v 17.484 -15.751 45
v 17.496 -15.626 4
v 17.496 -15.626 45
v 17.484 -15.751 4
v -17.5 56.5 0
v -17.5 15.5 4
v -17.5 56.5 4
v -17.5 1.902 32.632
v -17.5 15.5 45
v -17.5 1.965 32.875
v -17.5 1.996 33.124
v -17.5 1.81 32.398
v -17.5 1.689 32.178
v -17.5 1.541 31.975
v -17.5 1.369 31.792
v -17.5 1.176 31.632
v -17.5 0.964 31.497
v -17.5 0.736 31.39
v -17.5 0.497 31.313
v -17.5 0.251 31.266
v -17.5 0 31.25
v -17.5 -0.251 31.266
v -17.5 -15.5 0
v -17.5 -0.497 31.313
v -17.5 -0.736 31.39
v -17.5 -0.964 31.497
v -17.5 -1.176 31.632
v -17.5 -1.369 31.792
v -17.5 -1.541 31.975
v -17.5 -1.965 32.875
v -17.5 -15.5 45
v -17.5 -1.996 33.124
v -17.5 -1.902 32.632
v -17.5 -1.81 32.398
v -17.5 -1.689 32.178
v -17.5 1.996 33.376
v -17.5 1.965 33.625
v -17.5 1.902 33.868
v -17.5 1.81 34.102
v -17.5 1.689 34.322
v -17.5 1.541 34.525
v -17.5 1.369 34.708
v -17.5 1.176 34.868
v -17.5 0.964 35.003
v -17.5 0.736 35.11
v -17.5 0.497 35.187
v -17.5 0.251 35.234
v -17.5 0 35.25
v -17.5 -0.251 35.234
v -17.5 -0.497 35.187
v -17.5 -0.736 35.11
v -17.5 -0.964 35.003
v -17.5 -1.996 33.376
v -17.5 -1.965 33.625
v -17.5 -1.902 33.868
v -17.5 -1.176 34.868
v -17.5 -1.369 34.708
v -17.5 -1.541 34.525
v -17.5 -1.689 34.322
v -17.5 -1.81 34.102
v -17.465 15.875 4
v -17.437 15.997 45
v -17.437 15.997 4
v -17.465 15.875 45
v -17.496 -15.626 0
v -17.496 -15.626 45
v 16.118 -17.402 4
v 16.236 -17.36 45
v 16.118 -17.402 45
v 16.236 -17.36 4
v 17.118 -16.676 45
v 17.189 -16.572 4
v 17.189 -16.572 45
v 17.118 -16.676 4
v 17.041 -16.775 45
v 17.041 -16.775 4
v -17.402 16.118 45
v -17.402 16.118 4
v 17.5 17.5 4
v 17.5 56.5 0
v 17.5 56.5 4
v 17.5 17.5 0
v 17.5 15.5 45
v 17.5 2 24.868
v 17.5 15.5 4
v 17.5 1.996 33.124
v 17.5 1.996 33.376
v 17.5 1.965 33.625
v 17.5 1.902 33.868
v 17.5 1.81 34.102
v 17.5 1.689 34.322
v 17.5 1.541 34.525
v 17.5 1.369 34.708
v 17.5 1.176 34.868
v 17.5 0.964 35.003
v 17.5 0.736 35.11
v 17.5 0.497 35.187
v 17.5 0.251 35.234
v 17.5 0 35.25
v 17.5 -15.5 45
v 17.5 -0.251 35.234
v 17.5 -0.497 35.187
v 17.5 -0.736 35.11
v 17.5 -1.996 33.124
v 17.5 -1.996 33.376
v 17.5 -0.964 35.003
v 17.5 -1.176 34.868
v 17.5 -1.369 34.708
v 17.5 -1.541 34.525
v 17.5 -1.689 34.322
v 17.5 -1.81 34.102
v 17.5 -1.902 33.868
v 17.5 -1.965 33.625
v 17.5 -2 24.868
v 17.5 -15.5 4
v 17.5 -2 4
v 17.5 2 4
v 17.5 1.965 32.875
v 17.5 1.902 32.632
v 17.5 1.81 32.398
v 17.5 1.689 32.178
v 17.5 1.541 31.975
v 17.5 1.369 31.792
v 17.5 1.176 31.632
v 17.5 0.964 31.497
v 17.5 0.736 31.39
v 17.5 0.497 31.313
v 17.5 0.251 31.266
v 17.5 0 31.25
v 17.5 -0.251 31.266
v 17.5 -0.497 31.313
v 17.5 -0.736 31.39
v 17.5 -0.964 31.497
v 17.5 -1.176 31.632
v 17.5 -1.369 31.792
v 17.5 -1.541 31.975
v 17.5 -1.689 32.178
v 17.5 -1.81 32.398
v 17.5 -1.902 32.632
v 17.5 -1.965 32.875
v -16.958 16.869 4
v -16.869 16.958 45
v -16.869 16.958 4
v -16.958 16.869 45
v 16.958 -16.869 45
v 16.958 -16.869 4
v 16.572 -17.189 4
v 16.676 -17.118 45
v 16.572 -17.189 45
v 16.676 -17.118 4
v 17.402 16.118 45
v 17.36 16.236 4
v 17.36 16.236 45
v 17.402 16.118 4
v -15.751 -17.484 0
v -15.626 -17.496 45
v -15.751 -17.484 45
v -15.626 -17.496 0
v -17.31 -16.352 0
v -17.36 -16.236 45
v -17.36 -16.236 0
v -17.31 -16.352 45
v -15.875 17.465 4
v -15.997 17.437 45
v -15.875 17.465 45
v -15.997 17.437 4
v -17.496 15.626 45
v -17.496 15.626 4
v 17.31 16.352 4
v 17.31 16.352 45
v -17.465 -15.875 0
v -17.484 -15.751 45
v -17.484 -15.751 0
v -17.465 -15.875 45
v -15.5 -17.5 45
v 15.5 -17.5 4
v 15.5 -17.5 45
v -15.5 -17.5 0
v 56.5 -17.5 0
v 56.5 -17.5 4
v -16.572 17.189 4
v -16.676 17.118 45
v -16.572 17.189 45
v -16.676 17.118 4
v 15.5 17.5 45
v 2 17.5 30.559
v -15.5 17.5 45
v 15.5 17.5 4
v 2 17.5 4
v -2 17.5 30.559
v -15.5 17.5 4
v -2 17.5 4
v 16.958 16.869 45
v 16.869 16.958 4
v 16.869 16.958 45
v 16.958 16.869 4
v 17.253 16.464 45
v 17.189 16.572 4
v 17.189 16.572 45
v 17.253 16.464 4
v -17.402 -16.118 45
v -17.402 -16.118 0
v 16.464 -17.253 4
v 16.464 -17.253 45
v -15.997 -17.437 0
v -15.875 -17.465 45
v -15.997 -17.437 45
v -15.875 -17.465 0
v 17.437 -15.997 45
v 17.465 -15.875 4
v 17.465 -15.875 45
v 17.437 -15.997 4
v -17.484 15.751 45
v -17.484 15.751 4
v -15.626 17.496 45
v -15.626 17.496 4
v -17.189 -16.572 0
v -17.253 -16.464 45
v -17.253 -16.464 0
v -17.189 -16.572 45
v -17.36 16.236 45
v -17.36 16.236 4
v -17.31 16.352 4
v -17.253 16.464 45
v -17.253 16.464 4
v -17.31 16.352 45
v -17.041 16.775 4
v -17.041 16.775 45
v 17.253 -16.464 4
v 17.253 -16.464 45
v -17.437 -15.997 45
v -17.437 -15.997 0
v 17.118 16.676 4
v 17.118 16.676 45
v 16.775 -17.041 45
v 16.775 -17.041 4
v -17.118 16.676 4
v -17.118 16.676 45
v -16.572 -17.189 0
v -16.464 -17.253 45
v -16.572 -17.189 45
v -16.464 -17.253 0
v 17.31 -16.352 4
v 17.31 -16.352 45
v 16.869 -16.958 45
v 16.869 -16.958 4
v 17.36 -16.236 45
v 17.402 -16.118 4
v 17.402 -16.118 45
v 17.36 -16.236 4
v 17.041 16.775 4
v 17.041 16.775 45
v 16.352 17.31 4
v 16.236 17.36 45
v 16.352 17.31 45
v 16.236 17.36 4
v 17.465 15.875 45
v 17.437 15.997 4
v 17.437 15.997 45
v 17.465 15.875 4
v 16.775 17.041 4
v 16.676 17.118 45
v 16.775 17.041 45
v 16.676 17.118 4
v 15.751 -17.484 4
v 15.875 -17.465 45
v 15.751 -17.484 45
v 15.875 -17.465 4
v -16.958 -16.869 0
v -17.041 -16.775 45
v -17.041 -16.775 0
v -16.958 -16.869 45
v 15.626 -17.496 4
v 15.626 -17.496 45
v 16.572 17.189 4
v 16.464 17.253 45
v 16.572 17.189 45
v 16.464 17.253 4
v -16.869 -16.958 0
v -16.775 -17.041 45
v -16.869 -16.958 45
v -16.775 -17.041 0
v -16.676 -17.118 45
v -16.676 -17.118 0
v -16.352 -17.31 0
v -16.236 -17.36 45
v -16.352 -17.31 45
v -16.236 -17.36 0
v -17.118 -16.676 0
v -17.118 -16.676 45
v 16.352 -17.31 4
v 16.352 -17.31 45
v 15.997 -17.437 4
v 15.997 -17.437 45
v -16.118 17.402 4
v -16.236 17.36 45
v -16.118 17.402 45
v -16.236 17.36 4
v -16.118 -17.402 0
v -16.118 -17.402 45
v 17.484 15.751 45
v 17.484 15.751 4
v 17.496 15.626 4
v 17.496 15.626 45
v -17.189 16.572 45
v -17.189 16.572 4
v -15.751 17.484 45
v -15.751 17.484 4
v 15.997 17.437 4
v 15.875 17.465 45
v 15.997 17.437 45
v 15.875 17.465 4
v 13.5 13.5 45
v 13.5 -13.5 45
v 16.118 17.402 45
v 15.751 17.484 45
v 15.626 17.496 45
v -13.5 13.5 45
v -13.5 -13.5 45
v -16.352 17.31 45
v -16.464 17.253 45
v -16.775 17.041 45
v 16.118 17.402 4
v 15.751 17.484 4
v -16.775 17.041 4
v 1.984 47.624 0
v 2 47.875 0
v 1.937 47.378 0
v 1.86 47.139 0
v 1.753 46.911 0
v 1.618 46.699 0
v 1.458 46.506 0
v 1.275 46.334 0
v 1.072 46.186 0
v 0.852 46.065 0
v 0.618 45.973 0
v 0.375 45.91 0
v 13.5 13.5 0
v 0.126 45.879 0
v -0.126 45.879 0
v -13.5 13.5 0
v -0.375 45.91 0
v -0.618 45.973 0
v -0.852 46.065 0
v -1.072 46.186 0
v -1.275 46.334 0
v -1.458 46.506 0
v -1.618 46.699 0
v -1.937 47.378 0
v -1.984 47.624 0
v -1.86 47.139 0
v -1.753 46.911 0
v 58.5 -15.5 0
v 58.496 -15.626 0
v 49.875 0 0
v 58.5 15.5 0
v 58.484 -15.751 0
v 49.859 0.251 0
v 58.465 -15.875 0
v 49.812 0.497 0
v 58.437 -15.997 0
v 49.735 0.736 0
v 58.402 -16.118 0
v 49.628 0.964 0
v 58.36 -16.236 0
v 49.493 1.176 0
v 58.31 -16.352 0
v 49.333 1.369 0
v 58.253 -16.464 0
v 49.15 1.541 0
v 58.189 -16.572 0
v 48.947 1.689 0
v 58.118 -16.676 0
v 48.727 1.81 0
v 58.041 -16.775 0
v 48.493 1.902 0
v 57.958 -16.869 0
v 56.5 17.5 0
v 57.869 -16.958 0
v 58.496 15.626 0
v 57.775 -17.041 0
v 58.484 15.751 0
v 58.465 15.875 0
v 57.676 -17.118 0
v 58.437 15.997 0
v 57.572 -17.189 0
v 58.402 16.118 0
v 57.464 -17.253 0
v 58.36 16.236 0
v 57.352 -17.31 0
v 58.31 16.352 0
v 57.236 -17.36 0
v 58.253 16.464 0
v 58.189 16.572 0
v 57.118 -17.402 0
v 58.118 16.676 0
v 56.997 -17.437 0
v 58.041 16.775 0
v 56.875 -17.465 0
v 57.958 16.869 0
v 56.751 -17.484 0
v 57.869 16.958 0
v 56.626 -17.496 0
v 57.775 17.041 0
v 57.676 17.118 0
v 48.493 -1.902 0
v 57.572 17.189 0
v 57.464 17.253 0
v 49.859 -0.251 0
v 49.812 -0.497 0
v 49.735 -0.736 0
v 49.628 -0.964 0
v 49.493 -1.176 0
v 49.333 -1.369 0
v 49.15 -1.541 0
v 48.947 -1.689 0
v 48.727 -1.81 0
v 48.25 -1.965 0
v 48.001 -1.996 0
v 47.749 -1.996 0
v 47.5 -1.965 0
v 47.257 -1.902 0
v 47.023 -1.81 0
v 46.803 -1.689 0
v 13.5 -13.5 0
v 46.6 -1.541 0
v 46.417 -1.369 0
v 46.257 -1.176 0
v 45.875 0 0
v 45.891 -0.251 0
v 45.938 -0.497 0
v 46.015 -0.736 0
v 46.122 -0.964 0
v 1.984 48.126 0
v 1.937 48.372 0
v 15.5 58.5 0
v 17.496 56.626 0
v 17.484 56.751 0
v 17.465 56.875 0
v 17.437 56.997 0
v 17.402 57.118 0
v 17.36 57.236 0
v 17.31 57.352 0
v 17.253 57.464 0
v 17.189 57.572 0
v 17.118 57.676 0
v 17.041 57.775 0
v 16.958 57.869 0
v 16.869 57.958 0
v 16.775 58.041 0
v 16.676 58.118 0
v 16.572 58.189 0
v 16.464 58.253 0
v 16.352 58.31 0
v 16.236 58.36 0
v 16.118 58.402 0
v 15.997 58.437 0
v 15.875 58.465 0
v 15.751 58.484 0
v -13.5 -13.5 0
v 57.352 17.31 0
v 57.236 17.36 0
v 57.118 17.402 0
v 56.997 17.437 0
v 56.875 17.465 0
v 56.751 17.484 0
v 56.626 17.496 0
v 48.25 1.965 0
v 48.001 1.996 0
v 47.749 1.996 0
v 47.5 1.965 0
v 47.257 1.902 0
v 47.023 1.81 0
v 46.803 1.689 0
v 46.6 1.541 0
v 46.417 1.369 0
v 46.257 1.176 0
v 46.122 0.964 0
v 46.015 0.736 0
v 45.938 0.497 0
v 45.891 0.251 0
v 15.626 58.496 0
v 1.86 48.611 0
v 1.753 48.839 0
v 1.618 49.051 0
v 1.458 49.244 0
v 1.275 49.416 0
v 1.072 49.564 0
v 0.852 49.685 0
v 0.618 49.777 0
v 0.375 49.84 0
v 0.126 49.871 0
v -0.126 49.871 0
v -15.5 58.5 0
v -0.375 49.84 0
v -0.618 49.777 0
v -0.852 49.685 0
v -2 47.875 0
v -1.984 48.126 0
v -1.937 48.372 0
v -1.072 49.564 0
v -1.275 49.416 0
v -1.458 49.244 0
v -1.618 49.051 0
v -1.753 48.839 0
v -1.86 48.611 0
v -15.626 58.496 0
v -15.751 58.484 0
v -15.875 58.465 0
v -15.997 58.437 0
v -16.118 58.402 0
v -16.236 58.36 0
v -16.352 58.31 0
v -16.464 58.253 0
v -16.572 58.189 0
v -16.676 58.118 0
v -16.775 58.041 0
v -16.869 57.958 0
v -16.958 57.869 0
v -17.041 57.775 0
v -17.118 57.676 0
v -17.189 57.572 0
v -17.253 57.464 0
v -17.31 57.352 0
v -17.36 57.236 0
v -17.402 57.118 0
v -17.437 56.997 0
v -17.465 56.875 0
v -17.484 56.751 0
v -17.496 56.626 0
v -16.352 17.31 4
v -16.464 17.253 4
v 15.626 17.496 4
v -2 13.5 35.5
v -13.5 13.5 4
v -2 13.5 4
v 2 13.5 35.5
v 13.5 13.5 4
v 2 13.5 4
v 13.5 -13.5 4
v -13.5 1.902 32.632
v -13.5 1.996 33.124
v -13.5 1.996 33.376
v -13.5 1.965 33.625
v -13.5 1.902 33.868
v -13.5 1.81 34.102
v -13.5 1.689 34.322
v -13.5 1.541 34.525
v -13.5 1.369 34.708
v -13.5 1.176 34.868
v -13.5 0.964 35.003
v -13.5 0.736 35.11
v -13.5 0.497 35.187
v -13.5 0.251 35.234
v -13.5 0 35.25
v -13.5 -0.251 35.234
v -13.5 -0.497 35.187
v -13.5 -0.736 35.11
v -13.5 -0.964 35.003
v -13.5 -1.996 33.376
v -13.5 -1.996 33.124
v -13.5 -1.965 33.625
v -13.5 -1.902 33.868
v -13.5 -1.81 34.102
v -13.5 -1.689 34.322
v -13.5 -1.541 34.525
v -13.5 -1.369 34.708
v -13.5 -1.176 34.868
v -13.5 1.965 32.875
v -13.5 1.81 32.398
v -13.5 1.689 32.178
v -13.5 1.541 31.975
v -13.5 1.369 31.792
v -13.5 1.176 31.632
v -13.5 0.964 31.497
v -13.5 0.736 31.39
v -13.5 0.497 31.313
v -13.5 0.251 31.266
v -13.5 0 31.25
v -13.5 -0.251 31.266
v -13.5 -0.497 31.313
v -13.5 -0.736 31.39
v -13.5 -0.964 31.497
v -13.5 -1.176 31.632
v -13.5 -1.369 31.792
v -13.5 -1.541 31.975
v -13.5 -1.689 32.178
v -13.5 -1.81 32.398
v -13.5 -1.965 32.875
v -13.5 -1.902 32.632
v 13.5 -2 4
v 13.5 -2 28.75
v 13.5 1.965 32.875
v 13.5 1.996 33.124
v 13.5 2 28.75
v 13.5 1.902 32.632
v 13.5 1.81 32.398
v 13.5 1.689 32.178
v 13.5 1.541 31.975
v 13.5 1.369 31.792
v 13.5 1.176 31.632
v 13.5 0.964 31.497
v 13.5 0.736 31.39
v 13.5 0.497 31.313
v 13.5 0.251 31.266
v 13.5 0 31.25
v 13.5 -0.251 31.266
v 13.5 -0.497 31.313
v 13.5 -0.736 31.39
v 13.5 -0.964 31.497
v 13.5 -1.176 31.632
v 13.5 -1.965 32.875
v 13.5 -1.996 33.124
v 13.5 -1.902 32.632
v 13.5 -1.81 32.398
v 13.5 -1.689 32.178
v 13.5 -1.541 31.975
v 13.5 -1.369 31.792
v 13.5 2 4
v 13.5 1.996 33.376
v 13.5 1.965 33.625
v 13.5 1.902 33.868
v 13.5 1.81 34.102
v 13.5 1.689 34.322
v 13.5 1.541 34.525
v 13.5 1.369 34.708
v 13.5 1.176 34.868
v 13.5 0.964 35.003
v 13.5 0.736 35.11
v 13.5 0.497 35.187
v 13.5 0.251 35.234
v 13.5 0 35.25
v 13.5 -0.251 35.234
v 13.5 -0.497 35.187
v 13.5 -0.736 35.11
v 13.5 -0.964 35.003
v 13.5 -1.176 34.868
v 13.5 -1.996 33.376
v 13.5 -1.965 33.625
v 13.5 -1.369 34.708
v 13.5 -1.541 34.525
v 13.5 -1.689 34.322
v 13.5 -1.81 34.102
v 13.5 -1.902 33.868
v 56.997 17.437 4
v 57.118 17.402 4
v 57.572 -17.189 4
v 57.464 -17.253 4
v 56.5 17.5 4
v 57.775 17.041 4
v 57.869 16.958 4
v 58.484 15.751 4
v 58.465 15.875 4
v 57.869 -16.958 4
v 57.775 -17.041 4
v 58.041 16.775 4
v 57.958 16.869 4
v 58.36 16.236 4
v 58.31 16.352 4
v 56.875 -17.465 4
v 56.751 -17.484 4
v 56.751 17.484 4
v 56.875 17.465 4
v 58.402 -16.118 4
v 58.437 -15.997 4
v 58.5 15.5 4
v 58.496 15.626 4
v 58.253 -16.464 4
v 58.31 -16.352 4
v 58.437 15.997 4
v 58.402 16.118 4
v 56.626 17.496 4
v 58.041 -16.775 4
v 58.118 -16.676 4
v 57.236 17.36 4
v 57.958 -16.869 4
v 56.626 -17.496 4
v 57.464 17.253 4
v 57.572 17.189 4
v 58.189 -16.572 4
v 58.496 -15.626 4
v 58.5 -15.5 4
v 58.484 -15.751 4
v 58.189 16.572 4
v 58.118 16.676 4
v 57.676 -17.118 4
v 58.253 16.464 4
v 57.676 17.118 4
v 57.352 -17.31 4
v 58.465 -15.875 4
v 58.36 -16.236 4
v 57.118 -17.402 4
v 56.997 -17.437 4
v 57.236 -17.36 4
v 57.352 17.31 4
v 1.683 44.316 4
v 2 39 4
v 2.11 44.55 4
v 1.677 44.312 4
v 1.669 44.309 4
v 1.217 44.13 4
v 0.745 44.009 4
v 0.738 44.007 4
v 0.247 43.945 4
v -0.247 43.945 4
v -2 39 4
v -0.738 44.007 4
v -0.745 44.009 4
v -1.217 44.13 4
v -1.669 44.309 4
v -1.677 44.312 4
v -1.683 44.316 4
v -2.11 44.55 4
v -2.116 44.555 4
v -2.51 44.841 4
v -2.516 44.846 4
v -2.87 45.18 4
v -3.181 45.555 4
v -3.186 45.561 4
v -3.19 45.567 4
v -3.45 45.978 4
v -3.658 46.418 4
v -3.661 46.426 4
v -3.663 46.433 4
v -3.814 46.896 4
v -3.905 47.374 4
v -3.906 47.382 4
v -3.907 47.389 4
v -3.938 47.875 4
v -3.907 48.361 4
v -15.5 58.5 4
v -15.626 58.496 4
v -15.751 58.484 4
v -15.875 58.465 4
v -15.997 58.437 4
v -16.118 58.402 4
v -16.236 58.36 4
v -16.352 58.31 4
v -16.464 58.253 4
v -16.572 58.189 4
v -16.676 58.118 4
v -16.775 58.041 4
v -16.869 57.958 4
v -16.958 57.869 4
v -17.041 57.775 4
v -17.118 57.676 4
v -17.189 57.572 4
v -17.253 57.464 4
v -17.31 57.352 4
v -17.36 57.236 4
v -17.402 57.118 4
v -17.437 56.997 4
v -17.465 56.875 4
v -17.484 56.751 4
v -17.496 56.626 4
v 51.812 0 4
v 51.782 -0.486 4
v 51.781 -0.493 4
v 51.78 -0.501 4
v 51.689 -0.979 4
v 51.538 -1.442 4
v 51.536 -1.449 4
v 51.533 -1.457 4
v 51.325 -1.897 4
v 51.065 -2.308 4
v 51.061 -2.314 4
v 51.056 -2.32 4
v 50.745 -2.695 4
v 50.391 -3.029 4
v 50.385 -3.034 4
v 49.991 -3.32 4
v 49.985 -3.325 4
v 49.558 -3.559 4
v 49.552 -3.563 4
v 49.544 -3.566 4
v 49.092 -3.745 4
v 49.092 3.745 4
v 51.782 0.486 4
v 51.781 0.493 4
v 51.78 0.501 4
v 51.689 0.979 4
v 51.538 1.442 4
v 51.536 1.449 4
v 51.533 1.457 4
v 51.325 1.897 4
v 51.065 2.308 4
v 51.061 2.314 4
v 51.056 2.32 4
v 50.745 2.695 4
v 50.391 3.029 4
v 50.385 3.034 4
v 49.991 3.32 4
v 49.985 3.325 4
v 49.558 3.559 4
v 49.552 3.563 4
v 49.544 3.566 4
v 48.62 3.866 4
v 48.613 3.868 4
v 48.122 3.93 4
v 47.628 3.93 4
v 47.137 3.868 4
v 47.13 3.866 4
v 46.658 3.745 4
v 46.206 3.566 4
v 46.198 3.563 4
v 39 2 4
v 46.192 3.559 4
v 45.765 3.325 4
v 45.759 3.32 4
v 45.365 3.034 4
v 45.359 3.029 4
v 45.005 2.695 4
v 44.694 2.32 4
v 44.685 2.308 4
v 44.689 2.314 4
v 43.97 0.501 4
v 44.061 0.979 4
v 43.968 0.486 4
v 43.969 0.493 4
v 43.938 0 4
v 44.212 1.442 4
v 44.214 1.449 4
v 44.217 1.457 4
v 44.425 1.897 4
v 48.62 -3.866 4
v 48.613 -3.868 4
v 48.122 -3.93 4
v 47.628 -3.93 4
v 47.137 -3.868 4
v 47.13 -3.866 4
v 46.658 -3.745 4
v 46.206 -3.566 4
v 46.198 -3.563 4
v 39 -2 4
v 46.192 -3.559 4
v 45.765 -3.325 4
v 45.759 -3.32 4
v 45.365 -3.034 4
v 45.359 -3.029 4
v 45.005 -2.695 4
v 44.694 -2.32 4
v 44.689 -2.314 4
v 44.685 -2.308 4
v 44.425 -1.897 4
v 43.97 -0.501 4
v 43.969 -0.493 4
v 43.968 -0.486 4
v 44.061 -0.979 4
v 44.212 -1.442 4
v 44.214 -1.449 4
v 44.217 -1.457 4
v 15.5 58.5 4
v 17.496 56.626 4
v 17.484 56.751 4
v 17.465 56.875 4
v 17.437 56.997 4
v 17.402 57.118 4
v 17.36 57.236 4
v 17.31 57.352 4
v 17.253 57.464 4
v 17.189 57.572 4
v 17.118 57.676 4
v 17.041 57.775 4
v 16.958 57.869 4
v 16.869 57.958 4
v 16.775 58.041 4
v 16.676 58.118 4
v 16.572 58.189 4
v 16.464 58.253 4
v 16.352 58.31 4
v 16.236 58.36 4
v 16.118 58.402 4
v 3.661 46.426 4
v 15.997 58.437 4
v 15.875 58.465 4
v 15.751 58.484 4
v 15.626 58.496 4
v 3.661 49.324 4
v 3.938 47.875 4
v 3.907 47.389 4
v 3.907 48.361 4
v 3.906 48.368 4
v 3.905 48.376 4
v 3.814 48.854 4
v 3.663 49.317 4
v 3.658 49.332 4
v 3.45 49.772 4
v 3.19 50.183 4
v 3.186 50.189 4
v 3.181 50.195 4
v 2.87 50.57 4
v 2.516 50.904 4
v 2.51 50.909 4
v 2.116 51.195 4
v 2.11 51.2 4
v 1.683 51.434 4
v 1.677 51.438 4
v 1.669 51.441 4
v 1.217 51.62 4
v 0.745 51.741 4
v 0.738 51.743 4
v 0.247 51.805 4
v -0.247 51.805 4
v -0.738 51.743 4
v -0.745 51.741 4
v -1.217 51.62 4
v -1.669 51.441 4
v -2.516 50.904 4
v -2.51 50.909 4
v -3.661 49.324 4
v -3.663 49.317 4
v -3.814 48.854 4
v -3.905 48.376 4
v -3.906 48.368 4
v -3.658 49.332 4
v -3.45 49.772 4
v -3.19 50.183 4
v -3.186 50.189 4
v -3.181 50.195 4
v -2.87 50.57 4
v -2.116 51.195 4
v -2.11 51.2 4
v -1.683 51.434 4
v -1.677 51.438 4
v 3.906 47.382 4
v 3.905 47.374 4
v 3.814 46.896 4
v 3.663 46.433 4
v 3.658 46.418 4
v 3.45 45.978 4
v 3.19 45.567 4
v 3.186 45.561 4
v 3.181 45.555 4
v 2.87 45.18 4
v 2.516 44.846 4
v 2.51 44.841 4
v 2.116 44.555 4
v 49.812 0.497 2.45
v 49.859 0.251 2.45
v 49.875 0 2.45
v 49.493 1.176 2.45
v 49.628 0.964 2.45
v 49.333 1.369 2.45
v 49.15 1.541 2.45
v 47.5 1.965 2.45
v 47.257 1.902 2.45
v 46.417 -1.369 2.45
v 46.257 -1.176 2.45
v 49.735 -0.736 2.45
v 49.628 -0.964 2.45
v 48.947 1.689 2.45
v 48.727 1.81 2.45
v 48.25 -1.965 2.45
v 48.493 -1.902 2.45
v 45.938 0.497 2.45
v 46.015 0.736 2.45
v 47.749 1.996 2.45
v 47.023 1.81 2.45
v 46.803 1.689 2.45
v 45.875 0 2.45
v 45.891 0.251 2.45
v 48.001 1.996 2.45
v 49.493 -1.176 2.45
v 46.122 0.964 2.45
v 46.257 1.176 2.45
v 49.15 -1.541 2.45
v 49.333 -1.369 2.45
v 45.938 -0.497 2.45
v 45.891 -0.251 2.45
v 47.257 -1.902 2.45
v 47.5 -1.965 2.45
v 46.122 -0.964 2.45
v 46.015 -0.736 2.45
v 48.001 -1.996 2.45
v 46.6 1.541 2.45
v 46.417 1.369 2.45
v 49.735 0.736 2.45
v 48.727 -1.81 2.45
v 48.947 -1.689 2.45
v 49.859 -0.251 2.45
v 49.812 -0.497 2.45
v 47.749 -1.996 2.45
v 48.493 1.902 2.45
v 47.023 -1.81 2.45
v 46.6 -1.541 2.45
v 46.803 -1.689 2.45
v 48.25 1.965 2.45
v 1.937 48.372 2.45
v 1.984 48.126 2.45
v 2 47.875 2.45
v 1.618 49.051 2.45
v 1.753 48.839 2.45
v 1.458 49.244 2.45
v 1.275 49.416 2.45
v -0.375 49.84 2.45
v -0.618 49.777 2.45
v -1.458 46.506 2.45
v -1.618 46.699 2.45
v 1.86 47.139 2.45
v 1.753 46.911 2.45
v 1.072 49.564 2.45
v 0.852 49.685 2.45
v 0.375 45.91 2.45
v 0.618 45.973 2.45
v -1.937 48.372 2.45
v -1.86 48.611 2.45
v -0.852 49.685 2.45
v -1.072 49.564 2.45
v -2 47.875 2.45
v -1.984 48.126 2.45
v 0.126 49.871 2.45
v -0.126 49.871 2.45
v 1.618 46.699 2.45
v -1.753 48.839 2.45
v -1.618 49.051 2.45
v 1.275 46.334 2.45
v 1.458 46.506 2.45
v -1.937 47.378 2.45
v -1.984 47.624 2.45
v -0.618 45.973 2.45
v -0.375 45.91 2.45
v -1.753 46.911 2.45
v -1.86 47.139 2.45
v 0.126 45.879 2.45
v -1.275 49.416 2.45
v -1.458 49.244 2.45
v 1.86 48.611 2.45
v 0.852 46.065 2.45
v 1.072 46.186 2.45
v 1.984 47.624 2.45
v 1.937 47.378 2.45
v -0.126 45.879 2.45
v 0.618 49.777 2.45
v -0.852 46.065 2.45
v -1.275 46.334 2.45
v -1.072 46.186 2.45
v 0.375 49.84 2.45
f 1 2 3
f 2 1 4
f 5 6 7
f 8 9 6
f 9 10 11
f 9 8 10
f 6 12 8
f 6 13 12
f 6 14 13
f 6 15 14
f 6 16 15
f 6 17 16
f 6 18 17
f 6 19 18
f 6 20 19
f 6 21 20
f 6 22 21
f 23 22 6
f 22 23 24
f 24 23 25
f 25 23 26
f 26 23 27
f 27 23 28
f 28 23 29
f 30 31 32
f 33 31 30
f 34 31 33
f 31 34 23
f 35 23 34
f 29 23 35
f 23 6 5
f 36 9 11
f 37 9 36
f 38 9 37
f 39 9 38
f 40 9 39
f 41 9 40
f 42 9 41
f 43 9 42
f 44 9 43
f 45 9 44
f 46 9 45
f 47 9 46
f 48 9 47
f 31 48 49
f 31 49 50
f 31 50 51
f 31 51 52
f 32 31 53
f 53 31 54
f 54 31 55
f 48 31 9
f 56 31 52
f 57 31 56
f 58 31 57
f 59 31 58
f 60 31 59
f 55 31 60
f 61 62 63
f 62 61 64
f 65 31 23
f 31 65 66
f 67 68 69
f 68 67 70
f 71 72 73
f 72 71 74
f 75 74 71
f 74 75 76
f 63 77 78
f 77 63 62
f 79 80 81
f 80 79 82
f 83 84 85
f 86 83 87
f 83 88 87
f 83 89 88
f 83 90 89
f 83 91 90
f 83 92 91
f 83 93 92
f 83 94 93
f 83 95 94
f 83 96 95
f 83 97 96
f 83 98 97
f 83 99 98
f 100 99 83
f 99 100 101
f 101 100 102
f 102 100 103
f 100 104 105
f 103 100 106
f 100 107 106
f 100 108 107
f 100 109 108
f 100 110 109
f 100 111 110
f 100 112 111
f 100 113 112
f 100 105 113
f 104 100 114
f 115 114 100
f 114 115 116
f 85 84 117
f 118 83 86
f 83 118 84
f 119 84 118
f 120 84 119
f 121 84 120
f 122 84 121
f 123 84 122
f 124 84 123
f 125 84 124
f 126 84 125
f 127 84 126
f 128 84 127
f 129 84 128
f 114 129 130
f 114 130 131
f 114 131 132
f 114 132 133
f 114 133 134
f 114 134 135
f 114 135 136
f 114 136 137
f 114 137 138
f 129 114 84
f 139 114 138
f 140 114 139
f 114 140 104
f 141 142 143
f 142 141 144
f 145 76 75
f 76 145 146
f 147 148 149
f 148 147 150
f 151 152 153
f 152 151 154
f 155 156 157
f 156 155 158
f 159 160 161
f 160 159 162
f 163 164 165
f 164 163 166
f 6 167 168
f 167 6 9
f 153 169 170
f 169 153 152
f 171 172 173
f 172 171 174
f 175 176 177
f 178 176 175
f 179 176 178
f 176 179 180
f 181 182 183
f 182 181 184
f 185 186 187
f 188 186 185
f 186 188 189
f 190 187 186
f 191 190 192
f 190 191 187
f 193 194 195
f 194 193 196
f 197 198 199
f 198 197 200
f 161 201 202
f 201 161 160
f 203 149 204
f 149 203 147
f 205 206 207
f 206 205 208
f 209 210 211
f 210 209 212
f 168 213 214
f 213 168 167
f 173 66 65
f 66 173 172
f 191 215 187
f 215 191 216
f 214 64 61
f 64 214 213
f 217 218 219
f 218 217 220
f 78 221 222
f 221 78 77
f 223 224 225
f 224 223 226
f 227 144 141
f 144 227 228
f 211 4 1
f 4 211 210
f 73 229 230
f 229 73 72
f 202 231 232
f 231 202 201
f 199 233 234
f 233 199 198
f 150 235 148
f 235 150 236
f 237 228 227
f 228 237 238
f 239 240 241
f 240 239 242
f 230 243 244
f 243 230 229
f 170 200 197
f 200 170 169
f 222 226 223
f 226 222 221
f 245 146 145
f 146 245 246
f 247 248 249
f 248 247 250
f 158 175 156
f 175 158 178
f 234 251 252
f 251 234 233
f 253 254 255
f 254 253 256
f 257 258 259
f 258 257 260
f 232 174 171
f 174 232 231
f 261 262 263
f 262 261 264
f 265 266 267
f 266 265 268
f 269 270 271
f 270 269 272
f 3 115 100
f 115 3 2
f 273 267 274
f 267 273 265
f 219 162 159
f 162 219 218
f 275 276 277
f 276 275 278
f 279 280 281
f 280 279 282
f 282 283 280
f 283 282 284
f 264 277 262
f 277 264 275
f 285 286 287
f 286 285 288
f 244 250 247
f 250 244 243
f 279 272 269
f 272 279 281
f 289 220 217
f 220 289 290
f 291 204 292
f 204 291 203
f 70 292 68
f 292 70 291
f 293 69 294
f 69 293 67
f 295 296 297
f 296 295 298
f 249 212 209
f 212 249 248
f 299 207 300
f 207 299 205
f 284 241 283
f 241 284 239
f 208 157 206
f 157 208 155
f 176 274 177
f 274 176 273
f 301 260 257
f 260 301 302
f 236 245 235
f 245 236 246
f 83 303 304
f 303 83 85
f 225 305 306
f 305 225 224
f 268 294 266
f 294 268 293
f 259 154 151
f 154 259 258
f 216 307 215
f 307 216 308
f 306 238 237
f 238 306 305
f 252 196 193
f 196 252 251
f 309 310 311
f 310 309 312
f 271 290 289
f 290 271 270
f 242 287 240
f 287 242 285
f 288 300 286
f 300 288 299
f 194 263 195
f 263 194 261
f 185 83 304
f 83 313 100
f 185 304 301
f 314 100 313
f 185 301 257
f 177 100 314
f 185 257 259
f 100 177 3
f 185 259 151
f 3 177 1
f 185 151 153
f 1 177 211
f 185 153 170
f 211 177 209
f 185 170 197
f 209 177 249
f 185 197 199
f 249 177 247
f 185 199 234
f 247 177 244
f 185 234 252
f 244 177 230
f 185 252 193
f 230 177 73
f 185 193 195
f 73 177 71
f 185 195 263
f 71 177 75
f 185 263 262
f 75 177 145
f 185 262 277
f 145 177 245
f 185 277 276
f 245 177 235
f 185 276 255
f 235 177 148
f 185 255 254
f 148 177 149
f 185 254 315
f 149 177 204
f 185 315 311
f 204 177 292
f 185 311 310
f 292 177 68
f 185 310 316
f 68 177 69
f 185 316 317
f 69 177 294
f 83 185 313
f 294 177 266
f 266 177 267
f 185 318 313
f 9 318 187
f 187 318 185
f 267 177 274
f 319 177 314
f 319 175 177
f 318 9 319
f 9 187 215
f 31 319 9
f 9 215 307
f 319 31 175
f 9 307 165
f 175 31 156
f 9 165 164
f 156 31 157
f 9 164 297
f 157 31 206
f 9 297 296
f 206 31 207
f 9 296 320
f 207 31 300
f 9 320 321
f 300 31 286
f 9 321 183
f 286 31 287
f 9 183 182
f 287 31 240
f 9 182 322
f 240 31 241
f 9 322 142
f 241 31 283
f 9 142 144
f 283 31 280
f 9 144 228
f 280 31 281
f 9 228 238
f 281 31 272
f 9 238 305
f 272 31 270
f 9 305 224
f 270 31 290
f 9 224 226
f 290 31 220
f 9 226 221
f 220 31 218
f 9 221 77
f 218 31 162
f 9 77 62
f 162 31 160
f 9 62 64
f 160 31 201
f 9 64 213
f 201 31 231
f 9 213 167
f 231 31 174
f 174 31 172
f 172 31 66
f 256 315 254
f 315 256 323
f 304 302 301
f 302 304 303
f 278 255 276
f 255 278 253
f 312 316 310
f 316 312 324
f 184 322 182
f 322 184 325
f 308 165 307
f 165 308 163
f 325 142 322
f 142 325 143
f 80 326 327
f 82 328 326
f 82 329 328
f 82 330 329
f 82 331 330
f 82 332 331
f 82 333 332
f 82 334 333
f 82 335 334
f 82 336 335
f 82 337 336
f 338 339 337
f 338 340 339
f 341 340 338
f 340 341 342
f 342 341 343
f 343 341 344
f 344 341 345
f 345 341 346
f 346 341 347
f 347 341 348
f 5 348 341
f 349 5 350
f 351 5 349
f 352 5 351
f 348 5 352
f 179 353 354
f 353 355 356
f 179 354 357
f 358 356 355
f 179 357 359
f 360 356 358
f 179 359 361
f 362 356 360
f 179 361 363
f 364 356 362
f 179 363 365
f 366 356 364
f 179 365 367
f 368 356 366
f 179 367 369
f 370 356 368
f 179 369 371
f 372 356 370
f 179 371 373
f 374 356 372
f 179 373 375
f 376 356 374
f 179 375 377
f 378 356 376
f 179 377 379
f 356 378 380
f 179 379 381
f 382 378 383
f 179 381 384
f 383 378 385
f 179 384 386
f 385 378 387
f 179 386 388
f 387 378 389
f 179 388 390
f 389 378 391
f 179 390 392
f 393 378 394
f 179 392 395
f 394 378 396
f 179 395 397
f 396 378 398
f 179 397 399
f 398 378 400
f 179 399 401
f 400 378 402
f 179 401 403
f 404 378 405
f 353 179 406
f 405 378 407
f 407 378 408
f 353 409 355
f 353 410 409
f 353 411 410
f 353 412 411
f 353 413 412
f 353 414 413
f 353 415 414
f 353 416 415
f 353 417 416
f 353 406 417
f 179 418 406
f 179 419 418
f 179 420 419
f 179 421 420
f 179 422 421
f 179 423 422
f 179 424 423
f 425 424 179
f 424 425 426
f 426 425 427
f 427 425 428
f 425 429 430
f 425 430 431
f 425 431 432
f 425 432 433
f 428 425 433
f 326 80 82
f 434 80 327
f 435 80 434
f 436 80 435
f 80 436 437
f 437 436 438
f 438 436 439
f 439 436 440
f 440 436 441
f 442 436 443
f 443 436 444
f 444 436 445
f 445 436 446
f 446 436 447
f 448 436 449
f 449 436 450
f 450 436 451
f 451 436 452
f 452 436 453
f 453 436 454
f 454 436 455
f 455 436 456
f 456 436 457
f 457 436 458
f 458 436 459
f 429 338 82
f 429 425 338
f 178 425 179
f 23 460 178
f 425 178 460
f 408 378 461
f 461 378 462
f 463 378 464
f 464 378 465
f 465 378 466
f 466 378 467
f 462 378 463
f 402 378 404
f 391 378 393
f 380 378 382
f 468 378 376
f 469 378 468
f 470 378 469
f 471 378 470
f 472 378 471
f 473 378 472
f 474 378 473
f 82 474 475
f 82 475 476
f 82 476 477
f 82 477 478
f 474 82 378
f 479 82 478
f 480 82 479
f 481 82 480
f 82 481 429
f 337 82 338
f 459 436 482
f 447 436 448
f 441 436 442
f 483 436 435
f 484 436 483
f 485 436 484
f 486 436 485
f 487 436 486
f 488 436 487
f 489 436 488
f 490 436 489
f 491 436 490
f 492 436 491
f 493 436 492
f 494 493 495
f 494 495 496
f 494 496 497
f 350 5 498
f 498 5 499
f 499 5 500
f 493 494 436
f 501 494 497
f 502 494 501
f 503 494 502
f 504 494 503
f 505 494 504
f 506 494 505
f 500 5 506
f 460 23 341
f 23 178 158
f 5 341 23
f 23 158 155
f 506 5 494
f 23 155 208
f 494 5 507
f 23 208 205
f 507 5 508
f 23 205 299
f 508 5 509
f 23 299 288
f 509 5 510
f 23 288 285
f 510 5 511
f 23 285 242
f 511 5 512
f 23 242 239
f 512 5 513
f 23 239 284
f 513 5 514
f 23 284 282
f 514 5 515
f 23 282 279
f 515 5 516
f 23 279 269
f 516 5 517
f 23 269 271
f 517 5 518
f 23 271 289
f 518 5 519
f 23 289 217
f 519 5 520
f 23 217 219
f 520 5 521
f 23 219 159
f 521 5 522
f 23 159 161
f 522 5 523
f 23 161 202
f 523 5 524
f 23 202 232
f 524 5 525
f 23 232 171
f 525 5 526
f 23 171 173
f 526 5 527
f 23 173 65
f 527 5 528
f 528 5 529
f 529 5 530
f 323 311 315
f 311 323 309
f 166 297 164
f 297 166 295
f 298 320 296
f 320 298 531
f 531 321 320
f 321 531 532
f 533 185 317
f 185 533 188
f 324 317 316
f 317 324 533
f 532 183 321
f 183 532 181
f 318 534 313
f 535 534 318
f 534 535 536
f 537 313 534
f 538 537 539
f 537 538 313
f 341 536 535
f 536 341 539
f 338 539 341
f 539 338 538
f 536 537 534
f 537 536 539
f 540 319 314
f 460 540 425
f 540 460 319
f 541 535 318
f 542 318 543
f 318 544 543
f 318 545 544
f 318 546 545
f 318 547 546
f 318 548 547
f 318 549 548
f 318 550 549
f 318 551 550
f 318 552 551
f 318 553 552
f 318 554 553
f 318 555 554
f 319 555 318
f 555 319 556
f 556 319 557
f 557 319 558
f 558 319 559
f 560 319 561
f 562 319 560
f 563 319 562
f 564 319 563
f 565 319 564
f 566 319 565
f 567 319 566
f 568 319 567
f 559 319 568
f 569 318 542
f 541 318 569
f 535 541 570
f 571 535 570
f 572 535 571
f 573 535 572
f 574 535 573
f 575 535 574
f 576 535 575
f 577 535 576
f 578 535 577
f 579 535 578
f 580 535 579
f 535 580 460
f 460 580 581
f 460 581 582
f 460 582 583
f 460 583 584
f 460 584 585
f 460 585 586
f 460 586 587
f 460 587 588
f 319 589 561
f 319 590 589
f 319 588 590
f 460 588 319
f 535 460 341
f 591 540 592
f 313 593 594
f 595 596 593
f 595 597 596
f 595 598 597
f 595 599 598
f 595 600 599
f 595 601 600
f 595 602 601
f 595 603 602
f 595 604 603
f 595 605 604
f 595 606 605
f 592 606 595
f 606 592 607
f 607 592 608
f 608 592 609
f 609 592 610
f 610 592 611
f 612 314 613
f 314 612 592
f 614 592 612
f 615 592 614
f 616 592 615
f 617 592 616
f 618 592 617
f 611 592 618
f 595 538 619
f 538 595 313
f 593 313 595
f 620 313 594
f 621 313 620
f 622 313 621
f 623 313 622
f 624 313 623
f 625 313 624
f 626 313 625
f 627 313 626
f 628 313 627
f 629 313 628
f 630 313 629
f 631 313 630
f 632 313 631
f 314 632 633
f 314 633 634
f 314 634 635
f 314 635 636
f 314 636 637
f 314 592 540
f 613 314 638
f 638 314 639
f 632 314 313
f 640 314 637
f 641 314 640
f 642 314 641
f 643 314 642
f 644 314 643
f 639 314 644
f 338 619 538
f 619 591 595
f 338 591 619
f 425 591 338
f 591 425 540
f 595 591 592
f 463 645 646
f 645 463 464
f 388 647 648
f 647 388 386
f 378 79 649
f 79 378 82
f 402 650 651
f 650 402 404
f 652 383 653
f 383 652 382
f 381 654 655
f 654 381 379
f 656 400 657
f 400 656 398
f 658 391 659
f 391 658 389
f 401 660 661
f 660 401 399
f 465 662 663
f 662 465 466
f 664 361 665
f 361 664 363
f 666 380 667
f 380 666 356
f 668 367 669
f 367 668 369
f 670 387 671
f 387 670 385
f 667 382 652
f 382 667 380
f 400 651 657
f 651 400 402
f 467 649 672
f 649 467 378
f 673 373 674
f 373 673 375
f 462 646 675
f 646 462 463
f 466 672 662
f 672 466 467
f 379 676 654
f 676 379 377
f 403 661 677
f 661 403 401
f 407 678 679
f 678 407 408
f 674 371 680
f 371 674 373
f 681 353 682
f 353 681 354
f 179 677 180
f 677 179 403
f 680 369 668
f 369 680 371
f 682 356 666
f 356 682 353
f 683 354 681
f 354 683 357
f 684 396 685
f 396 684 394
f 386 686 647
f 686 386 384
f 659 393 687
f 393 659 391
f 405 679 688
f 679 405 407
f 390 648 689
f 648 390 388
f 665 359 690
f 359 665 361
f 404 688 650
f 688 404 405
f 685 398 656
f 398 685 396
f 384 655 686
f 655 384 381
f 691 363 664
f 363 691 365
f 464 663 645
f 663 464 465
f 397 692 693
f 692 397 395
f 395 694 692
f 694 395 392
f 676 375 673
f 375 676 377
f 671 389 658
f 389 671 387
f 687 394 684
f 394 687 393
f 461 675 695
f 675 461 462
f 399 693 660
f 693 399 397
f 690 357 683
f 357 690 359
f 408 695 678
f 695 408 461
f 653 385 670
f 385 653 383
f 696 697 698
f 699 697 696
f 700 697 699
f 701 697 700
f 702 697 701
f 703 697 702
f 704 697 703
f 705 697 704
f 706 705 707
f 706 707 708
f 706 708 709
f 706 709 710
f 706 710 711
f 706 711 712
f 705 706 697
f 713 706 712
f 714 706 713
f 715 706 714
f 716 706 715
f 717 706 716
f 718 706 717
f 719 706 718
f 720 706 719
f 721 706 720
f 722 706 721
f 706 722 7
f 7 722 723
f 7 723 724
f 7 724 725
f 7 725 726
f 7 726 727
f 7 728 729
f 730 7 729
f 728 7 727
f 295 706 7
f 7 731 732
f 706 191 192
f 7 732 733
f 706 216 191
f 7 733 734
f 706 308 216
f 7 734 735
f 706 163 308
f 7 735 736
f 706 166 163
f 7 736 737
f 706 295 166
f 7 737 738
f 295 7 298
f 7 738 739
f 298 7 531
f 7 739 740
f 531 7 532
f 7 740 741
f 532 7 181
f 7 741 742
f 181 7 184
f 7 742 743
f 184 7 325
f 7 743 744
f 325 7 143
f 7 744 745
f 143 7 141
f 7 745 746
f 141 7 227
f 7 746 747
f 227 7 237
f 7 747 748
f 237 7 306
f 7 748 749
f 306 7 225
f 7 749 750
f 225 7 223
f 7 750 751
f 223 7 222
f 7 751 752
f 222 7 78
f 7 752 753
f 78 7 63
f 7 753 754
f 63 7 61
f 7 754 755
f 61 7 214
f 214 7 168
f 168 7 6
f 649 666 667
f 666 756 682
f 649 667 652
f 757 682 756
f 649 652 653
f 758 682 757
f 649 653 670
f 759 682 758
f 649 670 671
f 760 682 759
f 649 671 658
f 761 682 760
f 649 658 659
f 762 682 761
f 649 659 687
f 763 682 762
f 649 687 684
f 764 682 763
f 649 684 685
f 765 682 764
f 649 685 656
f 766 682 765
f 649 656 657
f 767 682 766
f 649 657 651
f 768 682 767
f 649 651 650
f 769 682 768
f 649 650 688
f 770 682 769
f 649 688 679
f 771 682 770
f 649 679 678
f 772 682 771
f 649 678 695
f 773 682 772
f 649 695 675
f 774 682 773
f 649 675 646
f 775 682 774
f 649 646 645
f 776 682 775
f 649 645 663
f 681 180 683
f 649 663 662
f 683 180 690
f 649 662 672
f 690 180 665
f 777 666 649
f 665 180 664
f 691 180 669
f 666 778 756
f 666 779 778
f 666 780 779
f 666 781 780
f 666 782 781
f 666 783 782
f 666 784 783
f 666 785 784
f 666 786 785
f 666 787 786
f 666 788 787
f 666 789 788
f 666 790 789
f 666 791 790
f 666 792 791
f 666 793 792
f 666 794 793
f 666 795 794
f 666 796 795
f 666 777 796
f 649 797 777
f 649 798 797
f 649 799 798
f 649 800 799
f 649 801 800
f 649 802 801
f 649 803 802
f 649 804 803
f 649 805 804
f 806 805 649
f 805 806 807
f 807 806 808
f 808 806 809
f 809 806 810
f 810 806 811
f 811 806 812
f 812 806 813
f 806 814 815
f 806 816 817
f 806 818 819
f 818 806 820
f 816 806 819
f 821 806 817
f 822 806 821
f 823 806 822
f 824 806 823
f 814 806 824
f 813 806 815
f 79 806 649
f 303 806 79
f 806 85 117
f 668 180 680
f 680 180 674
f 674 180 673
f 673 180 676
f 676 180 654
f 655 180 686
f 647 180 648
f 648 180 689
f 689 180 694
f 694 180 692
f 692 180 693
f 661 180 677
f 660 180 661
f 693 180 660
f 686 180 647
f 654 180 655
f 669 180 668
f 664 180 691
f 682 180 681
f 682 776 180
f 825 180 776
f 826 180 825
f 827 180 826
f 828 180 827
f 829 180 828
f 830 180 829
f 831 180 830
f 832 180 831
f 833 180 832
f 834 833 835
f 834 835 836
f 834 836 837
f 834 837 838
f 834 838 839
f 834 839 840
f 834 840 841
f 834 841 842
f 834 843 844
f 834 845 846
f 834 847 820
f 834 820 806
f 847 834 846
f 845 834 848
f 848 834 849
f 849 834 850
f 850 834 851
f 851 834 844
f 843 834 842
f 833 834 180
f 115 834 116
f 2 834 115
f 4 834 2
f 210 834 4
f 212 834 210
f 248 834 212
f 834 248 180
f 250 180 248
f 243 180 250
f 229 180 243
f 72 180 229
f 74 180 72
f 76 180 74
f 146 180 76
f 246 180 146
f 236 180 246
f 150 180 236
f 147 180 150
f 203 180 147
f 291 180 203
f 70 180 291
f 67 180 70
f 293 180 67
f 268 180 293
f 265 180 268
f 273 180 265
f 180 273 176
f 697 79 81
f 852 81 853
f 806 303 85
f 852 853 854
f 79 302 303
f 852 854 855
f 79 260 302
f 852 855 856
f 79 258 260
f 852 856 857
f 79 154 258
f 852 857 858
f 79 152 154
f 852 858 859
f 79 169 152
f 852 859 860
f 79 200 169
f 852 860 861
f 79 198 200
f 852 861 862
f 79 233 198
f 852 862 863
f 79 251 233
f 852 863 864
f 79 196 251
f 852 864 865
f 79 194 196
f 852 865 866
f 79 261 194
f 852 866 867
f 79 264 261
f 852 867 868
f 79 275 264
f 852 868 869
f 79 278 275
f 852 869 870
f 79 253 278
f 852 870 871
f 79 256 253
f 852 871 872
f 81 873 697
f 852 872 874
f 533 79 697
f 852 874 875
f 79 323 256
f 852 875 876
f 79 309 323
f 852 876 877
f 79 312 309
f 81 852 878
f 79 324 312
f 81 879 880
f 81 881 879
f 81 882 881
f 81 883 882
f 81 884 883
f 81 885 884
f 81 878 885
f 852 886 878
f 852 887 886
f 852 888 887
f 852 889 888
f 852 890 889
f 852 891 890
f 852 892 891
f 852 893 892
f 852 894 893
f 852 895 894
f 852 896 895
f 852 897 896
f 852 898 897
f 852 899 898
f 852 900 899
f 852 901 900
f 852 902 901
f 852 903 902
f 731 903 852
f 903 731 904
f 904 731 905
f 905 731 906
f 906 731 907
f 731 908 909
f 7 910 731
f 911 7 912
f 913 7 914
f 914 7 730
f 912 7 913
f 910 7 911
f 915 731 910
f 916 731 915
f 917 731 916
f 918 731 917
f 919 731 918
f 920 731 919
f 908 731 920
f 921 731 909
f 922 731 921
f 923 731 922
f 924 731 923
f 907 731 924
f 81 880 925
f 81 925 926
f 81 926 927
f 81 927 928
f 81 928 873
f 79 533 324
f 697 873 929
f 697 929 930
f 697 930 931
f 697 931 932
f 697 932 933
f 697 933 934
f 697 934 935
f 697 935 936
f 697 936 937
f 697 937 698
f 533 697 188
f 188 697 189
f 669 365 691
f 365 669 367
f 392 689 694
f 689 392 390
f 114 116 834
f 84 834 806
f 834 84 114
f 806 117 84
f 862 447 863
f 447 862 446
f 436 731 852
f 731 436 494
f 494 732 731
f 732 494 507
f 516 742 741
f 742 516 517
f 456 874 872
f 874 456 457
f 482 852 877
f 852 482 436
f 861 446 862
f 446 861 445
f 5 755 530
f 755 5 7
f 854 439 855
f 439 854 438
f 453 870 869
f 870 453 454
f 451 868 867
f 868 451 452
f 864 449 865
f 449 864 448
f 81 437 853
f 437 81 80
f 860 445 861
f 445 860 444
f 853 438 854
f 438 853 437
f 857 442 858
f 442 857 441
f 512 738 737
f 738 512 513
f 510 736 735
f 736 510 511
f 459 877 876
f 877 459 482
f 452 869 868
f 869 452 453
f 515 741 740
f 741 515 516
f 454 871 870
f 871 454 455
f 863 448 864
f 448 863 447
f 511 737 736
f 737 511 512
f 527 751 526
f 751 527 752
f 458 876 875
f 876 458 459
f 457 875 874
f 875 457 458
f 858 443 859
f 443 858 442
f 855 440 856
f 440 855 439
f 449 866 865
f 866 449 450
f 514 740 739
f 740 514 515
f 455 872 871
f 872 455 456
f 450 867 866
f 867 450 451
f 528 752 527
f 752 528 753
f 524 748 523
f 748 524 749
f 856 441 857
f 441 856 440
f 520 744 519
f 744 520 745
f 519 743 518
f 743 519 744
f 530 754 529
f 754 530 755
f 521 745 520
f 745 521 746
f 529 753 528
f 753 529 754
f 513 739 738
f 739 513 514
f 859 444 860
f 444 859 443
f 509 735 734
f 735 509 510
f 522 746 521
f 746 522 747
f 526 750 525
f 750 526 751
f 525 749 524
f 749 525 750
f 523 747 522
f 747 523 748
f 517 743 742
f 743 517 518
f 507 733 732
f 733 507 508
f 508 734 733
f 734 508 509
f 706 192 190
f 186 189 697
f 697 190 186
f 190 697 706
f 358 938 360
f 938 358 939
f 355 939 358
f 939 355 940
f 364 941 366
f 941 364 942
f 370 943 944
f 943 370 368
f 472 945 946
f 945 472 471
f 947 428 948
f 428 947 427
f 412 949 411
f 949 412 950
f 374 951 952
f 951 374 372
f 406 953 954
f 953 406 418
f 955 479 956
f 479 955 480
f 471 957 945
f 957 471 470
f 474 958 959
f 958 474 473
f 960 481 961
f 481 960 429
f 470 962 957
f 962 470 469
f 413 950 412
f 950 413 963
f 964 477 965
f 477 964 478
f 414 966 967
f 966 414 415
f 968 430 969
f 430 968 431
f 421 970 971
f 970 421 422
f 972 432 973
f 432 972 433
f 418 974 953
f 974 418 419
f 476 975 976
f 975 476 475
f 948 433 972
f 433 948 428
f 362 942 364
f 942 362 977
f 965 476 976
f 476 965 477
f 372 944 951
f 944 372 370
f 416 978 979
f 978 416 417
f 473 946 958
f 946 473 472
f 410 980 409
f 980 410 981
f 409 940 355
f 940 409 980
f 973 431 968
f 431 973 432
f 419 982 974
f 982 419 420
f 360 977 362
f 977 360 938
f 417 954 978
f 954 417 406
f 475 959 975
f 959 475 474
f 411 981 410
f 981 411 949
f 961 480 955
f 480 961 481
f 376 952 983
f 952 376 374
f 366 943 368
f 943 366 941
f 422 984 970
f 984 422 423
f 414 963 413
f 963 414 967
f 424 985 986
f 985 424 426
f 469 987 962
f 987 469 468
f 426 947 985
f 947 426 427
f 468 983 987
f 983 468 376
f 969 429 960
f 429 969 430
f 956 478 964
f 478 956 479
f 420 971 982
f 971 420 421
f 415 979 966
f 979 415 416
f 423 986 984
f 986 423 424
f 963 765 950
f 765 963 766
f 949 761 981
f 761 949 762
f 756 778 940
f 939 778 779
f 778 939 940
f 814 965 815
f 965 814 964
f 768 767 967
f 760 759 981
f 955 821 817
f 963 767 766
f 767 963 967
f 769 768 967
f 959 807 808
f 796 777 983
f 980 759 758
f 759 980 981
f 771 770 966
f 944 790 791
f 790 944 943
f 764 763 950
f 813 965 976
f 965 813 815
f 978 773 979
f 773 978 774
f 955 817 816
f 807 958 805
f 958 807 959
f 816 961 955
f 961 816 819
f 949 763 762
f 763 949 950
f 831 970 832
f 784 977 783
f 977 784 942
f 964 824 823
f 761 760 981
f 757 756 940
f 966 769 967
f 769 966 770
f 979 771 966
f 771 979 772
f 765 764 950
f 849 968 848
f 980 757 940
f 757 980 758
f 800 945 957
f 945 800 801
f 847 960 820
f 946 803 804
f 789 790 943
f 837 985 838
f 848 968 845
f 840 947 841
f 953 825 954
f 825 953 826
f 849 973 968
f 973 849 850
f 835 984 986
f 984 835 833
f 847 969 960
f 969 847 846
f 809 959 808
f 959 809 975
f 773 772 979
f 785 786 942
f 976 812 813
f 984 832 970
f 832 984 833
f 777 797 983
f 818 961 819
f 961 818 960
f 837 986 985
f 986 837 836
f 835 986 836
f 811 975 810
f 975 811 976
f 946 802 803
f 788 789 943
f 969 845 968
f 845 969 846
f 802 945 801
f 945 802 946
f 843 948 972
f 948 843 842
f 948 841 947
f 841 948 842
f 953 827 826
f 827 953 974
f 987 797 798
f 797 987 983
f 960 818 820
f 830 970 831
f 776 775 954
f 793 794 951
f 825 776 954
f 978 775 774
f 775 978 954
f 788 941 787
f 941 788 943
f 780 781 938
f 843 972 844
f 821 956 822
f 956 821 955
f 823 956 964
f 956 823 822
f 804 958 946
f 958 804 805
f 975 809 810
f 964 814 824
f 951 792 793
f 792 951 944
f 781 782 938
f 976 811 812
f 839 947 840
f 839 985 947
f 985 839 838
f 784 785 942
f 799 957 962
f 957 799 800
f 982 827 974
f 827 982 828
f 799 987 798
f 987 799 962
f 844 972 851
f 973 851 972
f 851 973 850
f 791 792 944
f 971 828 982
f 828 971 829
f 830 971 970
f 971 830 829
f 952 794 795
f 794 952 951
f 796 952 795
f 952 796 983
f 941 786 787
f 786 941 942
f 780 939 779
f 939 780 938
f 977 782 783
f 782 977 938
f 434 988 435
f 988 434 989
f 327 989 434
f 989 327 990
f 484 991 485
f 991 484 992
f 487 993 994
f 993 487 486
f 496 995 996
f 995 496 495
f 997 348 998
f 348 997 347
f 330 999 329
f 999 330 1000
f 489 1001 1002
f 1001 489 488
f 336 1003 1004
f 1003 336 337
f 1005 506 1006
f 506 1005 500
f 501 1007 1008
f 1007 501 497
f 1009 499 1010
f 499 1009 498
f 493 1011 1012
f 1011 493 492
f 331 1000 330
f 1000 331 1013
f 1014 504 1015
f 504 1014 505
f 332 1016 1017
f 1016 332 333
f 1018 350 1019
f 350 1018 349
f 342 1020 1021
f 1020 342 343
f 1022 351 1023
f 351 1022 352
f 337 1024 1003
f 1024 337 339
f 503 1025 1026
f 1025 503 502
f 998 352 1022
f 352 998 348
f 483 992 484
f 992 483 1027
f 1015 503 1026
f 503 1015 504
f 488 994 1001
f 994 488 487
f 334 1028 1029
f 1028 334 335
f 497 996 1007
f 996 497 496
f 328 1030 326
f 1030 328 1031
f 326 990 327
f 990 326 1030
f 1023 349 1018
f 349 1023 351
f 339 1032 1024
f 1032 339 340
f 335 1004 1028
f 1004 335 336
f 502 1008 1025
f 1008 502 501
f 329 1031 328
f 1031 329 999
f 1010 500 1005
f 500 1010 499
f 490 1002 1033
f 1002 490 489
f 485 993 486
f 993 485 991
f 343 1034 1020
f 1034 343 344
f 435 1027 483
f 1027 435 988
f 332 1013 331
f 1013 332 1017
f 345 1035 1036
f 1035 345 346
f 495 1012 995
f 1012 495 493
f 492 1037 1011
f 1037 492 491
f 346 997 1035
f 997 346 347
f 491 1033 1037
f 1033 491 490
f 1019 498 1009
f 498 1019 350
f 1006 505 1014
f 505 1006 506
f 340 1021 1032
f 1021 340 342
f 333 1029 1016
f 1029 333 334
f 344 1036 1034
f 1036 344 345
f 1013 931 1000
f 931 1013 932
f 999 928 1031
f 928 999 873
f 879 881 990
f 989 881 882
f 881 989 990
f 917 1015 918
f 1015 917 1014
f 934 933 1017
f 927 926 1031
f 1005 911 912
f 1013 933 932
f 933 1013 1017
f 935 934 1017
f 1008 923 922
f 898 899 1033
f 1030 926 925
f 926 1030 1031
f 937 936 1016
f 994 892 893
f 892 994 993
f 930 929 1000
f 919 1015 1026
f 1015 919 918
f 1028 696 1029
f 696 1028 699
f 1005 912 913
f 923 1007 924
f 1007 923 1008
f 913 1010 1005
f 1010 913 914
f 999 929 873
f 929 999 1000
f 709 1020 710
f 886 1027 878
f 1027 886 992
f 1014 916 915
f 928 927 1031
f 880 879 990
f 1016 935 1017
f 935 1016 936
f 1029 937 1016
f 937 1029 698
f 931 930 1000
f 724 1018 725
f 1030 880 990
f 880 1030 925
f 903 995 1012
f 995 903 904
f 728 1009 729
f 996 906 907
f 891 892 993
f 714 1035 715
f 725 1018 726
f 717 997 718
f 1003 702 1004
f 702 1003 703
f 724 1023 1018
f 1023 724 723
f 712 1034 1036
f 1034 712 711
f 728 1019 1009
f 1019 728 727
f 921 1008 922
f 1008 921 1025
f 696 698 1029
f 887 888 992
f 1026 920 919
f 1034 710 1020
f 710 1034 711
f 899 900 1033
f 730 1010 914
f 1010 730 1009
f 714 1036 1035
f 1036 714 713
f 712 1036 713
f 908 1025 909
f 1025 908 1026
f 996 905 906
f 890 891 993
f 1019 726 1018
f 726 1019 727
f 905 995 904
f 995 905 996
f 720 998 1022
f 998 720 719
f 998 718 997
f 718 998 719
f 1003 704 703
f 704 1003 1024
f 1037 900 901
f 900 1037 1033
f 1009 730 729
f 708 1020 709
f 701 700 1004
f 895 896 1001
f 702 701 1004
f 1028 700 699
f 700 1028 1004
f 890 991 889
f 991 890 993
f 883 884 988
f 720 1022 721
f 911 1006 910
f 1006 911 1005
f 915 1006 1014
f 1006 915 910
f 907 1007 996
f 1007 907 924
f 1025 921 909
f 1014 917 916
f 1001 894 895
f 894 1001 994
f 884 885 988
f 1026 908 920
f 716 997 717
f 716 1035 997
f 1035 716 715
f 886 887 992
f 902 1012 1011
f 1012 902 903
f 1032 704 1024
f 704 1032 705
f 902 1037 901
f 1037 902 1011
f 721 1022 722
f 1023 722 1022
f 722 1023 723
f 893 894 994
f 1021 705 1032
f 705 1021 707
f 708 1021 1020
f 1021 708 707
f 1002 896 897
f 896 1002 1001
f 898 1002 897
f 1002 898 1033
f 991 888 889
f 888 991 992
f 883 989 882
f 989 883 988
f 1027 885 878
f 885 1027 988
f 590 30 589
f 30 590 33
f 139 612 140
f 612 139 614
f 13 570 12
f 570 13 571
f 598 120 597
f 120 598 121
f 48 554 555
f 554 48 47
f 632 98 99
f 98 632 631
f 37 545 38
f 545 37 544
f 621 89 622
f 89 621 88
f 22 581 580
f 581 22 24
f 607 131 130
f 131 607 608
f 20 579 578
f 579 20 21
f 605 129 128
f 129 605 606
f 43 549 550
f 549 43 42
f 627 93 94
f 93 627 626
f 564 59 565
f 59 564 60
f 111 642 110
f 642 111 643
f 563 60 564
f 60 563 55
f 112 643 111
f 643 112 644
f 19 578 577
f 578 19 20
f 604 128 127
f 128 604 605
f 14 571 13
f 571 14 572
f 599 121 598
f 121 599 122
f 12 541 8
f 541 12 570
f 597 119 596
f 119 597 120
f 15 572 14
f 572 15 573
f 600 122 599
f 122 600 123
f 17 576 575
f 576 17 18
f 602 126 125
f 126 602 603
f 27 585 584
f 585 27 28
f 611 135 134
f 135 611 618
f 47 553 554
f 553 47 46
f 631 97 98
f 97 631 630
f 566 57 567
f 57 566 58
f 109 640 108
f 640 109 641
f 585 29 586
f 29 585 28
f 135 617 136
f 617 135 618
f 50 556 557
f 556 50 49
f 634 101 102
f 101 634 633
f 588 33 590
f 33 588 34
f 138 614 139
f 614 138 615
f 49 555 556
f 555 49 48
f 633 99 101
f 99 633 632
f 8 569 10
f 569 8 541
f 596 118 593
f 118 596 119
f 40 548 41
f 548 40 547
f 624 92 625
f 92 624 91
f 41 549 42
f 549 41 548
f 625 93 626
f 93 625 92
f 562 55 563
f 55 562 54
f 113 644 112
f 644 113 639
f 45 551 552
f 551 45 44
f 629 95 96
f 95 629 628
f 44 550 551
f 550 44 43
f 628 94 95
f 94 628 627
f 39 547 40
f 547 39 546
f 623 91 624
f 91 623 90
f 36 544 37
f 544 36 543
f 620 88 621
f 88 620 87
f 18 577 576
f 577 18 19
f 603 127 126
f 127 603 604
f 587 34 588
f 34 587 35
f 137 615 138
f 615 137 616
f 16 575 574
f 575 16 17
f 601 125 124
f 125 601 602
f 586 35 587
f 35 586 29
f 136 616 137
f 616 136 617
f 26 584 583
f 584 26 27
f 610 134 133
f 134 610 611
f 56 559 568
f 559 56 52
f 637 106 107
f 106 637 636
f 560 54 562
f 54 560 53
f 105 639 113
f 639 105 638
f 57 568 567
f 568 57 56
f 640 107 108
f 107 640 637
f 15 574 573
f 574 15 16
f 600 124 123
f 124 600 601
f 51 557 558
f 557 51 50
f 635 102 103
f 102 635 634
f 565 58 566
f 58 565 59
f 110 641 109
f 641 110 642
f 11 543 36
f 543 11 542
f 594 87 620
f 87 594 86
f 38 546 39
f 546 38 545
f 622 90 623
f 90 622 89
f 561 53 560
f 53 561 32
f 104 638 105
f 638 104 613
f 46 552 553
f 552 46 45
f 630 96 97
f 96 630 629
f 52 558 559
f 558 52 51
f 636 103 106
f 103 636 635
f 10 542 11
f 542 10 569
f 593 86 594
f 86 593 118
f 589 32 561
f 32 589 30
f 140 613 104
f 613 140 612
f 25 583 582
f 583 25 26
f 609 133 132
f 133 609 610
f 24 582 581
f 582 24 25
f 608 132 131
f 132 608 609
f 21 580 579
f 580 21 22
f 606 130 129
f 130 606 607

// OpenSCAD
use <MCAD/triangles.scad>

lengthX = 45;
woodX = 27;
wallThick = 4;
screwHead = 8;
screwD = 4;

lengthY = lengthX+woodX;


difference() {
    union() {
        // attache() on Z axis    
        translate([0,0,0.5*(lengthX)])
            rotate([0,0,90]) attache(woodX,woodX,lengthX,wallThick);
        
        // T on X-Z direction
        translate([0.5*(woodX+lengthX),0,0.5*wallThick]) 
            roundedBox(lengthX,woodX+2*wallThick,wallThick,wallThick/2);
        //  triangle reinforcement X-Z plane
        translate([woodX/2,-wallThick/2,wallThick]) 
                rotate([0,-90,-90]) 
                triangle( 0.7*lengthX-wallThick*1.5, 0.55*lengthX, wallThick);
        
        // T on Y-Z direction
        translate([0,0.5*(woodX+lengthX),0.5*wallThick]) 
            roundedBox(woodX+2*wallThick,lengthX,wallThick,wallThick/2);
        //  triangle reinforcement X-Z plane
        translate([-wallThick/2,woodX/2,wallThick]) 
                rotate([90,0,90]) 
                triangle( 0.7*lengthX, 0.7*lengthX-wallThick*1.5, wallThick);
        
        
    }
    // Add holes for screws (1 hole per bar)
    /* X-Y plan below */
    translate([0.5*woodX+0.675*lengthX+wallThick, 0, -0.05]) {
        #cylinder(h=wallThick+0.1, d=screwD, $fn=50);
        translate([0, 0, wallThick-1.5])
        #cylinder(h=1.5+0.1, d1=screwD, d2=screwHead, $fn=50);
    }
    translate([0, 0.5*woodX+0.675*lengthX+wallThick, -0.05]) {
        #cylinder(h=wallThick+0.1, d=screwD, $fn=50);
        translate([0, 0, wallThick-1.5])
        #cylinder(h=1.5+0.1, d1=screwD, d2=screwHead, $fn=50);
    }
    
    /* Z-X plane */  
    translate([0.5*woodX+2*wallThick,0,0.65*lengthX+wallThick]) 
        rotate([0,-90,0]) 
        #cylinder(h=wallThick*4+woodX+0.1, d=screwD, $fn=50);
    /*translate([0, -(0.5*woodX-0.05), 0.55*lengthX]) 
        rotate([90,0,0]) {
        #cylinder(h=wallThick+0.1, d=screwD, $fn=50);
        
    }*/
     
    
}

module attache(sizeX,sizeY,sizeZ,thick)
difference() {
    roundedBox(sizeX+2*thick,sizeY+2*thick,sizeZ, thick/2);
    #translate([0,0,0]) cube([sizeX,sizeY,sizeZ+3*thick], true);
}

module roundedBox(x,y,z,rad){
	hull() {
        translate([-x/2+rad, y/2-rad,-z/2]) cylinder(h=z,r=rad, $fn=100);
        translate([ x/2-rad, y/2-rad,-z/2]) cylinder(h=z,r=rad, $fn=100);
        translate([-x/2+rad,-y/2+rad,-z/2]) cylinder(h=z,r=rad, $fn=100);
        translate([ x/2-rad,-y/2+rad,-z/2]) cylinder(h=z,r=rad, $fn=100);
   }
}

module backFace(x,y,z,rad){
    difference() {
        union() {
            translate([0,0,z/4]) roundedBox(x,y,z/2,rad);
            hull() {
                translate([-x/2+rad, y/2-rad,z/2]) sphere(r=rad, $fn=100);
                translate([ x/2-rad, y/2-rad,z/2]) sphere(r=rad, $fn=100);
                translate([-x/2+rad,-y/2+rad,z/2]) sphere(r=rad, $fn=100);
                translate([ x/2-rad,-y/2+rad,z/2]) sphere(r=rad, $fn=100);
           }
        }
        translate([0,0,-z/2]) cube([x,y,z], true);
    }
}
